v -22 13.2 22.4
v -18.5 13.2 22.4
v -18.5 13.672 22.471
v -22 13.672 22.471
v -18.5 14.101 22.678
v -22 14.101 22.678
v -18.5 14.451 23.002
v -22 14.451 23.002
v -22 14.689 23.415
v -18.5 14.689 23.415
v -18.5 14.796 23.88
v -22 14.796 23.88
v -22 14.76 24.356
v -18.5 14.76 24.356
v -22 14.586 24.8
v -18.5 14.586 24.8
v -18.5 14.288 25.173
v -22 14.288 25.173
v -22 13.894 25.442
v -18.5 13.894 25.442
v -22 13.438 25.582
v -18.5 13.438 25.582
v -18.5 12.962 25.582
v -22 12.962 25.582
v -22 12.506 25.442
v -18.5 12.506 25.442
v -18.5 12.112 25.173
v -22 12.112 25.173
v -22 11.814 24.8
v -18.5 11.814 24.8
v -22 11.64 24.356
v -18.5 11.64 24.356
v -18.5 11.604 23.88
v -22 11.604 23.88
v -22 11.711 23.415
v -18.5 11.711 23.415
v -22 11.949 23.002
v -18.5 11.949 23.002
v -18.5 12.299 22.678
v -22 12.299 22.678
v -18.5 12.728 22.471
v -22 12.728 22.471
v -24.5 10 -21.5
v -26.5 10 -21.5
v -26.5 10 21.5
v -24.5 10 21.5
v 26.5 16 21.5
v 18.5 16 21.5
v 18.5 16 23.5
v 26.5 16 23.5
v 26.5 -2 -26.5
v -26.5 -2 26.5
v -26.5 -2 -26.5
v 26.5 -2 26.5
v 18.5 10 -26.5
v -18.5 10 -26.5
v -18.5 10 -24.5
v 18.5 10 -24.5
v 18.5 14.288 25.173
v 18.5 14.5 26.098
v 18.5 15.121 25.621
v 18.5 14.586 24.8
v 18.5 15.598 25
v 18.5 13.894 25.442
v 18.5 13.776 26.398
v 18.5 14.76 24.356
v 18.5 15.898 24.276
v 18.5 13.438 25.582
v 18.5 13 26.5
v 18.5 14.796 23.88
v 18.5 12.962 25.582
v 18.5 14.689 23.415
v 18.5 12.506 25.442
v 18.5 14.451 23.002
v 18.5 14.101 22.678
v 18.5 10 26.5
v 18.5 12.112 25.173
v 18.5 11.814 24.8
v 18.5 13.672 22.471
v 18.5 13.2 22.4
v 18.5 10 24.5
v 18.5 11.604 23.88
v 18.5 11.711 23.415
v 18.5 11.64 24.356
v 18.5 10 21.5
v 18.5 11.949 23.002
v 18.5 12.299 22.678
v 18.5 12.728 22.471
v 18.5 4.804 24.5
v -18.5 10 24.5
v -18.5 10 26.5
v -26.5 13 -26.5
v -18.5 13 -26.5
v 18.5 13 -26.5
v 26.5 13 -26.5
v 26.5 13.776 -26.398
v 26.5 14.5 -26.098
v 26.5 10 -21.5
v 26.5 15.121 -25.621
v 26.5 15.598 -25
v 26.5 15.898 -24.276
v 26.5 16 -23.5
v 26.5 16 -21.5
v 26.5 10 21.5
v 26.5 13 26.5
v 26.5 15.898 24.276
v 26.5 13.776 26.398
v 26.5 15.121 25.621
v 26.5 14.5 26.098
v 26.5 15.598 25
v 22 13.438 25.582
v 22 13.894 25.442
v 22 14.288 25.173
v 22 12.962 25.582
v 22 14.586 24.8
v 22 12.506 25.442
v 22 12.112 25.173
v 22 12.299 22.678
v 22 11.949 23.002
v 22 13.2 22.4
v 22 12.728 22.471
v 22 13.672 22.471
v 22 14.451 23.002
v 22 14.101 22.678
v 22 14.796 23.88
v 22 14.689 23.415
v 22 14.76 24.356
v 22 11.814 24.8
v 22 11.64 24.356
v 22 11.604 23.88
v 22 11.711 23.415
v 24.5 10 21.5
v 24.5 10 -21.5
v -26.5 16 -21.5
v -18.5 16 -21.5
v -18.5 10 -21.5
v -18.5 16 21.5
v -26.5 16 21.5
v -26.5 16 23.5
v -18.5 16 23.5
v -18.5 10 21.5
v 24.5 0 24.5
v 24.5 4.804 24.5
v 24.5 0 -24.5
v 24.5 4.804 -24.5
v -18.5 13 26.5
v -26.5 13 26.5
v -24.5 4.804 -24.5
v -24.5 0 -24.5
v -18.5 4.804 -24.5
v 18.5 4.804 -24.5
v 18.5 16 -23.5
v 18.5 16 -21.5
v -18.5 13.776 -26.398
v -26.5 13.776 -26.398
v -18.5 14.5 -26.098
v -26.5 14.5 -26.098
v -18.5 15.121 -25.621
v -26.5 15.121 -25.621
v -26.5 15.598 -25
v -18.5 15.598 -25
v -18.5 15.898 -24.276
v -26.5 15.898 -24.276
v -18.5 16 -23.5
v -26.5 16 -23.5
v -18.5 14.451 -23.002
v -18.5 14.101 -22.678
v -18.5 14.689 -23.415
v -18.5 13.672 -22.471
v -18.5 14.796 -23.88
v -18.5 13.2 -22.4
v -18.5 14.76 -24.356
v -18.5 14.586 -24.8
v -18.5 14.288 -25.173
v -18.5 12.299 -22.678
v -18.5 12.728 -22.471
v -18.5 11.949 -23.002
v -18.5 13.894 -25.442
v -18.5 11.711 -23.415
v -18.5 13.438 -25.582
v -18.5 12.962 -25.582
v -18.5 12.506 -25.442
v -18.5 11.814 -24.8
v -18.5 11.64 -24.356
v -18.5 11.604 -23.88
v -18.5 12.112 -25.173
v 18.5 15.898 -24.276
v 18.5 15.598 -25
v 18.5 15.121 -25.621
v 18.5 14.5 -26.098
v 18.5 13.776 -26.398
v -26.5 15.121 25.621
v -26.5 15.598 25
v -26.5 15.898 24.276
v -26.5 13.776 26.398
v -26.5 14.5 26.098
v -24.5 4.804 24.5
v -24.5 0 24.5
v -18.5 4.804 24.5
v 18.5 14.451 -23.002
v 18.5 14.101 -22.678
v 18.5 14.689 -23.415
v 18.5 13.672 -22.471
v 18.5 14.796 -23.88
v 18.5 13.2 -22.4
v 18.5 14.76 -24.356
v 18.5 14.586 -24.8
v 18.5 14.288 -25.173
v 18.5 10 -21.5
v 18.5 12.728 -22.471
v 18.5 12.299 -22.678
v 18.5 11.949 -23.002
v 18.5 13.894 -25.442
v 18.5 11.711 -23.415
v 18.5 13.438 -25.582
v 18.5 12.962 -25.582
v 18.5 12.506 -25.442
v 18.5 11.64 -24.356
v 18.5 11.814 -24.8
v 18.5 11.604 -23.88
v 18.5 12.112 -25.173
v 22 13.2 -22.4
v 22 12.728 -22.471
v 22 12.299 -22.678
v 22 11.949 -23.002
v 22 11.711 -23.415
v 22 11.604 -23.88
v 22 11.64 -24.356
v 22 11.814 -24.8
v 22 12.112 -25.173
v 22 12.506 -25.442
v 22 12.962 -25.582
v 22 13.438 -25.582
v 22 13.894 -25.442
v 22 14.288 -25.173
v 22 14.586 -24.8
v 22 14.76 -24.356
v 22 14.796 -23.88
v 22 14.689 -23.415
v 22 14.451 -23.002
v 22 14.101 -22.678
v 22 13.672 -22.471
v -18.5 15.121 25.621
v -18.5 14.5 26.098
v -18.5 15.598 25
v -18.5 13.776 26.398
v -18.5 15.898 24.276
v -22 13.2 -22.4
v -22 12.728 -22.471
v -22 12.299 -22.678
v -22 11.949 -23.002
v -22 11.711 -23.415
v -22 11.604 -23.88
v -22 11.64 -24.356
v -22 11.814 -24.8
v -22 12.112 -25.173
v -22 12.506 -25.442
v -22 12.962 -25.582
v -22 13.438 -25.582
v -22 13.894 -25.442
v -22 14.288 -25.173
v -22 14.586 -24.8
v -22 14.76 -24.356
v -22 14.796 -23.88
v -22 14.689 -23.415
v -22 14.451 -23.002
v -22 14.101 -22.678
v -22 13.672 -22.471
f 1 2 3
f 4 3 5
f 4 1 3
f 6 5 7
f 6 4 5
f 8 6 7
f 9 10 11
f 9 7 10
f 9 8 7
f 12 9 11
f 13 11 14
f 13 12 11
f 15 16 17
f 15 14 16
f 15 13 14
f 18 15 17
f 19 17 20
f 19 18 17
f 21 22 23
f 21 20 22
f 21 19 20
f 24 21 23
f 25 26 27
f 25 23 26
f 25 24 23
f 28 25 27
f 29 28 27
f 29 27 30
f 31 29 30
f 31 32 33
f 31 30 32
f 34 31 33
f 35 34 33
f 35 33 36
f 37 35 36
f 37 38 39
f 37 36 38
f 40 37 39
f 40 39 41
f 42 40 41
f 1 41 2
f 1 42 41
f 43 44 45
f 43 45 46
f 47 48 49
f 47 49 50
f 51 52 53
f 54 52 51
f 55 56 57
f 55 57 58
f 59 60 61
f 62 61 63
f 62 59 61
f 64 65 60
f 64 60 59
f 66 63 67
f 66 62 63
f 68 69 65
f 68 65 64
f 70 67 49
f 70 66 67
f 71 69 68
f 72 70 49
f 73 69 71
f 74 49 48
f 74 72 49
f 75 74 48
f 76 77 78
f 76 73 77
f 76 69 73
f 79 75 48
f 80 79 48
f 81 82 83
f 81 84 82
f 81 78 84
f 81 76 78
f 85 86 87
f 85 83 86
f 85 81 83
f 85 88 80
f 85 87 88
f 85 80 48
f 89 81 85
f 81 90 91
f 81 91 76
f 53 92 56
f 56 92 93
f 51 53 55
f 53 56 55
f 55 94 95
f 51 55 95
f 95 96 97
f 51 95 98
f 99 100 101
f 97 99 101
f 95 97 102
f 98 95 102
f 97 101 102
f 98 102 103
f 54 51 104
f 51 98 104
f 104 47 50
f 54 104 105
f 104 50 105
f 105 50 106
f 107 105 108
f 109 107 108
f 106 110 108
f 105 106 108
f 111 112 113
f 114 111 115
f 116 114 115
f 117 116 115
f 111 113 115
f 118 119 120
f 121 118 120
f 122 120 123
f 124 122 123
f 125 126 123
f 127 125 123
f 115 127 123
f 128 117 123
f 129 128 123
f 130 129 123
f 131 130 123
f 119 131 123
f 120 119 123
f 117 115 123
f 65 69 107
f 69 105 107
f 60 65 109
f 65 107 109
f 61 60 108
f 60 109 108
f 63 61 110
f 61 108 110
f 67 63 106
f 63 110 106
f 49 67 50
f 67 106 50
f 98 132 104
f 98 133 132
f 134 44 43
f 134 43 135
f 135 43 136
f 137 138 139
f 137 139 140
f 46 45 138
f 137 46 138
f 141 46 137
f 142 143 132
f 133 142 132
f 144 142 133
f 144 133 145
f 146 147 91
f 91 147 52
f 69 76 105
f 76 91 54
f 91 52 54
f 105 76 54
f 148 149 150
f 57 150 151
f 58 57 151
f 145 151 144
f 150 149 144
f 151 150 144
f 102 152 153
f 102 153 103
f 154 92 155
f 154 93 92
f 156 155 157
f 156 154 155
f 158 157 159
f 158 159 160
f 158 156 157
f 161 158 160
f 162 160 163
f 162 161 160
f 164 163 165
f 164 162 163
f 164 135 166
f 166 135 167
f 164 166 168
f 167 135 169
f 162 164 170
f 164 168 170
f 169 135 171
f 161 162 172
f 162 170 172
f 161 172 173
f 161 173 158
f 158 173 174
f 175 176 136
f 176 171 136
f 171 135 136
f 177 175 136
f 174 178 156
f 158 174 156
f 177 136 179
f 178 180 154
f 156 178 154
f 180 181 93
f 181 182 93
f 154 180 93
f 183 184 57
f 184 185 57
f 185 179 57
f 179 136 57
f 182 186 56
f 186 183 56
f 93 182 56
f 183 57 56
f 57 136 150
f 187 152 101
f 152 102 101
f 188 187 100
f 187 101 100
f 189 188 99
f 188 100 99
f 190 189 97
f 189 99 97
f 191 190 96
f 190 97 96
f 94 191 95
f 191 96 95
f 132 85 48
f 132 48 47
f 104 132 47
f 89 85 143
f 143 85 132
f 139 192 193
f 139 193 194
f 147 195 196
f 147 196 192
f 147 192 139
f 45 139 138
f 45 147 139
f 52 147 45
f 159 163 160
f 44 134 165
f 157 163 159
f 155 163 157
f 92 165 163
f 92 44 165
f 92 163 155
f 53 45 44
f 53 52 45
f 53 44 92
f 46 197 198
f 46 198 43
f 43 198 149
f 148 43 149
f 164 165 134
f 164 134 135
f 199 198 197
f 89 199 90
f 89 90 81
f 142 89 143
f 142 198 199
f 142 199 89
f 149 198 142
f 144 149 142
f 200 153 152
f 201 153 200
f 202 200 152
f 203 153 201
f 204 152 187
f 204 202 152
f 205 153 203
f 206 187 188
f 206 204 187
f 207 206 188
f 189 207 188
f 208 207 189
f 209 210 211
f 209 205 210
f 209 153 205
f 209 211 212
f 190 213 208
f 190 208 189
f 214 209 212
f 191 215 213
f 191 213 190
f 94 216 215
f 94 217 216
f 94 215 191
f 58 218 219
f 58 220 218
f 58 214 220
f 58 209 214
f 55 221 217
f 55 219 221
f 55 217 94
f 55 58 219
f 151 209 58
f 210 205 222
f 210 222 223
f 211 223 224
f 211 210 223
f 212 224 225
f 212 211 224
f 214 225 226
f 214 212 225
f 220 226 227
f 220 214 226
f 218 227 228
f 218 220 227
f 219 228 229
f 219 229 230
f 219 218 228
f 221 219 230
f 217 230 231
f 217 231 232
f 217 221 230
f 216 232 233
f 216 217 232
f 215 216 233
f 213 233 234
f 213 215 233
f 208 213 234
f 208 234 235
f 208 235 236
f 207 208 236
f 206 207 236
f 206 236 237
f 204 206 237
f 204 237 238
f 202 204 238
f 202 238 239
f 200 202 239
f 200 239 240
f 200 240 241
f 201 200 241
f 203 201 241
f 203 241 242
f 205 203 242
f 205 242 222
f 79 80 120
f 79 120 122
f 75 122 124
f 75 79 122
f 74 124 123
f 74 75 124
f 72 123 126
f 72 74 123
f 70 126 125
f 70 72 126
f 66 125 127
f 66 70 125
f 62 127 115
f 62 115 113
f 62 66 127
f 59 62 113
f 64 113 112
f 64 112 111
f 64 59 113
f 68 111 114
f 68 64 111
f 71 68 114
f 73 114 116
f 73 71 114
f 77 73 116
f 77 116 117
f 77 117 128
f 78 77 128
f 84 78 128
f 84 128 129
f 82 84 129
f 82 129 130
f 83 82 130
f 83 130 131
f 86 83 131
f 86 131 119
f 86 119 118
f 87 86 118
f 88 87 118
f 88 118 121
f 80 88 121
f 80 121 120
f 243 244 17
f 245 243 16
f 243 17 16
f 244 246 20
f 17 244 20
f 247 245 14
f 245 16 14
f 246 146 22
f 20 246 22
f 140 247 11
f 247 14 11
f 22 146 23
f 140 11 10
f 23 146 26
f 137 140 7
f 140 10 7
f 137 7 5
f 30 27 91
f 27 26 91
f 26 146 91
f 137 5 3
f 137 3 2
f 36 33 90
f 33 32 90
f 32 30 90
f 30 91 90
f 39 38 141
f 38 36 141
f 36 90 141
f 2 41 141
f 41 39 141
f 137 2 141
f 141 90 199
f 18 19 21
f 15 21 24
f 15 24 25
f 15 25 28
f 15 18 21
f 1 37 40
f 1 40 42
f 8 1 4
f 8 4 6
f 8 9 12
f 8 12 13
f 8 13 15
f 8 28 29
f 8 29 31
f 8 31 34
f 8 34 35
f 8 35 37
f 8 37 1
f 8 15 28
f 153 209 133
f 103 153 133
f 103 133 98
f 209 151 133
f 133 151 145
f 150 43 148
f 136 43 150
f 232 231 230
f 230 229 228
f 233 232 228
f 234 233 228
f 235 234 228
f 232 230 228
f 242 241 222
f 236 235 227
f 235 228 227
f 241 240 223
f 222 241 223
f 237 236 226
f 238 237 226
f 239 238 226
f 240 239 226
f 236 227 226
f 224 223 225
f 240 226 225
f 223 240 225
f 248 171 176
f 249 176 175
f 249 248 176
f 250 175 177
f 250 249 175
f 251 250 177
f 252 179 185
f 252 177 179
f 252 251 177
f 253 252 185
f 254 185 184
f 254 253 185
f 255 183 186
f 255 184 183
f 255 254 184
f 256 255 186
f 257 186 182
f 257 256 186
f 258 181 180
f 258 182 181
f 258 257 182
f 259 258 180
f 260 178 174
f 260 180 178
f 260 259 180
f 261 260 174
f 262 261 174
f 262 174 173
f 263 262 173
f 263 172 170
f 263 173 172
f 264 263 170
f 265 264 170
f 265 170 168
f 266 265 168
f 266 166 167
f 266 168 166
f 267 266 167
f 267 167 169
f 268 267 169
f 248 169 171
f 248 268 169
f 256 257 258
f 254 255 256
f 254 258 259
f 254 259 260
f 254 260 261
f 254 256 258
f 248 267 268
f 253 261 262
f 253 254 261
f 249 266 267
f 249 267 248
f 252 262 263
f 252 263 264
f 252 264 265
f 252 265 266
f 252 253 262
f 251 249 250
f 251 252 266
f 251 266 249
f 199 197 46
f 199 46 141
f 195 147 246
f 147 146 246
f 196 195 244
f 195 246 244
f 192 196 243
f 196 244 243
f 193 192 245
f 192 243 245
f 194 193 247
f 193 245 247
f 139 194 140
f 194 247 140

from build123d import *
from OCP.BRepFilletAPI import BRepFilletAPI_MakeChamfer

# Parameters (mm, degrees)
SKETCH1_W               = 53
SKETCH1_H               = 53
SKETCH1_W_2             = 49
SKETCH1_H_2             = 49
BOSS_EXTRUDE1_DEPTH     = 10
SKETCH2_W               = 53
SKETCH2_H               = 53
BOSS_EXTRUDE2_DEPTH     = 2
SKETCH3_W               = 8
SKETCH3_H               = 5
BOSS_EXTRUDE3_DEPTH     = 6
CHAMFER3_SIZE           = 5.196152423
CHAMFER3_SIZE_2         = 3
CUT_EXTRUDE1_DEPTH      = 22
CUT_EXTRUDE1_DEPTH_BACK = 22
SKETCH4_R               = 1.6
FILLET3_R               = 3


with BuildPart() as part:
    # Sketch1 → Boss-Extrude1 (new body)
    with BuildSketch(Plane(origin=(0, 0, 0), x_dir=(1, 0, 0), z_dir=(0, 1, 0))):
        Rectangle(SKETCH1_W, SKETCH1_H)
        Rectangle(SKETCH1_W_2, SKETCH1_H_2, mode=Mode.SUBTRACT)
    extrude(amount=BOSS_EXTRUDE1_DEPTH)

    # Sketch2 → Boss-Extrude2 (add)
    with BuildSketch(Plane.XZ):
        Rectangle(SKETCH2_W, SKETCH2_H)
    extrude(amount=BOSS_EXTRUDE2_DEPTH)

    # Sketch3 → Boss-Extrude3 (add)
    with BuildSketch(Plane(origin=(0, 10, 0), x_dir=(1, 0, 0), z_dir=(0, 1, 0))):
        with Locations((-22.5, -24)):
            Rectangle(SKETCH3_W, SKETCH3_H)
        with Locations((22.5, -24)):
            Rectangle(SKETCH3_W, SKETCH3_H)
        with Locations((22.5, 24)):
            Rectangle(SKETCH3_W, SKETCH3_H)
        with Locations((-22.5, 24)):
            Rectangle(SKETCH3_W, SKETCH3_H)
    extrude(amount=BOSS_EXTRUDE3_DEPTH)

    # Chamfer3
    chamfer3_edges_1 = [part.edges().sort_by_distance(p)[0] for p in [
        (-21.5, 10, -24.5),
    ]]
    chamfer3_side_1 = [part.faces().sort_by_distance(p)[0] for p in [
        (-21.5, 9.94, -24.5),
    ]]
    chamfer3_edges_2 = [part.edges().sort_by_distance(p)[0] for p in [
        (-21.5, 10, 24.5),
    ]]
    chamfer3_side_2 = [part.faces().sort_by_distance(p)[0] for p in [
        (-21.5, 10, 24.44),
    ]]
    chamfer3_edges_3 = [part.edges().sort_by_distance(p)[0] for p in [
        (21.5, 10, 24.5),
    ]]
    chamfer3_side_3 = [part.faces().sort_by_distance(p)[0] for p in [
        (21.5, 9.94, 24.5),
    ]]
    chamfer3_edges_4 = [part.edges().sort_by_distance(p)[0] for p in [
        (21.5, 10, -24.5),
    ]]
    chamfer3_side_4 = [part.faces().sort_by_distance(p)[0] for p in [
        (21.5, 10, -24.44),
    ]]
    chamfer3 = BRepFilletAPI_MakeChamfer(part.part.solid().wrapped)
    for e in chamfer3_edges_1:
        chamfer3.Add(CHAMFER3_SIZE - 0.0001, CHAMFER3_SIZE_2 - 0.0001, e.wrapped, chamfer3_side_1[0].wrapped)
    for e in chamfer3_edges_2:
        chamfer3.Add(CHAMFER3_SIZE_2 - 0.0001, CHAMFER3_SIZE - 0.0001, e.wrapped, chamfer3_side_2[0].wrapped)
    for e in chamfer3_edges_3:
        chamfer3.Add(CHAMFER3_SIZE - 0.0001, CHAMFER3_SIZE_2 - 0.0001, e.wrapped, chamfer3_side_3[0].wrapped)
    for e in chamfer3_edges_4:
        chamfer3.Add(CHAMFER3_SIZE_2 - 0.0001, CHAMFER3_SIZE - 0.0001, e.wrapped, chamfer3_side_4[0].wrapped)
    add(Compound.cast(chamfer3.Shape()), mode=Mode.REPLACE)  # a hair under: the kernel refuses the full size

    # Sketch4 → Cut-Extrude1 (cut, two sides: drawn at the far end of the back side and taken through both)
    with BuildSketch(Plane(origin=(0, 0, 0), x_dir=(0, 0, -1), z_dir=(1, 0, 0)).offset(-CUT_EXTRUDE1_DEPTH_BACK)):
        with Locations((-24, 13.2)):
            Circle(SKETCH4_R)
        with Locations(Location((24, 13.2, 0), (0, 0, 180))):
            Circle(SKETCH4_R)
    extrude(amount=CUT_EXTRUDE1_DEPTH + CUT_EXTRUDE1_DEPTH_BACK, mode=Mode.SUBTRACT)

    # Fillet3
    fillet3_edges = [part.edges().sort_by_distance(p)[0] for p in [
        (-22.5, 16, 26.5),
        (22.5, 16, 26.5),
        (22.5, 16, -26.5),
        (-22.5, 16, -26.5),
    ]]
    fillet(fillet3_edges, radius=FILLET3_R)


solid = part.part
